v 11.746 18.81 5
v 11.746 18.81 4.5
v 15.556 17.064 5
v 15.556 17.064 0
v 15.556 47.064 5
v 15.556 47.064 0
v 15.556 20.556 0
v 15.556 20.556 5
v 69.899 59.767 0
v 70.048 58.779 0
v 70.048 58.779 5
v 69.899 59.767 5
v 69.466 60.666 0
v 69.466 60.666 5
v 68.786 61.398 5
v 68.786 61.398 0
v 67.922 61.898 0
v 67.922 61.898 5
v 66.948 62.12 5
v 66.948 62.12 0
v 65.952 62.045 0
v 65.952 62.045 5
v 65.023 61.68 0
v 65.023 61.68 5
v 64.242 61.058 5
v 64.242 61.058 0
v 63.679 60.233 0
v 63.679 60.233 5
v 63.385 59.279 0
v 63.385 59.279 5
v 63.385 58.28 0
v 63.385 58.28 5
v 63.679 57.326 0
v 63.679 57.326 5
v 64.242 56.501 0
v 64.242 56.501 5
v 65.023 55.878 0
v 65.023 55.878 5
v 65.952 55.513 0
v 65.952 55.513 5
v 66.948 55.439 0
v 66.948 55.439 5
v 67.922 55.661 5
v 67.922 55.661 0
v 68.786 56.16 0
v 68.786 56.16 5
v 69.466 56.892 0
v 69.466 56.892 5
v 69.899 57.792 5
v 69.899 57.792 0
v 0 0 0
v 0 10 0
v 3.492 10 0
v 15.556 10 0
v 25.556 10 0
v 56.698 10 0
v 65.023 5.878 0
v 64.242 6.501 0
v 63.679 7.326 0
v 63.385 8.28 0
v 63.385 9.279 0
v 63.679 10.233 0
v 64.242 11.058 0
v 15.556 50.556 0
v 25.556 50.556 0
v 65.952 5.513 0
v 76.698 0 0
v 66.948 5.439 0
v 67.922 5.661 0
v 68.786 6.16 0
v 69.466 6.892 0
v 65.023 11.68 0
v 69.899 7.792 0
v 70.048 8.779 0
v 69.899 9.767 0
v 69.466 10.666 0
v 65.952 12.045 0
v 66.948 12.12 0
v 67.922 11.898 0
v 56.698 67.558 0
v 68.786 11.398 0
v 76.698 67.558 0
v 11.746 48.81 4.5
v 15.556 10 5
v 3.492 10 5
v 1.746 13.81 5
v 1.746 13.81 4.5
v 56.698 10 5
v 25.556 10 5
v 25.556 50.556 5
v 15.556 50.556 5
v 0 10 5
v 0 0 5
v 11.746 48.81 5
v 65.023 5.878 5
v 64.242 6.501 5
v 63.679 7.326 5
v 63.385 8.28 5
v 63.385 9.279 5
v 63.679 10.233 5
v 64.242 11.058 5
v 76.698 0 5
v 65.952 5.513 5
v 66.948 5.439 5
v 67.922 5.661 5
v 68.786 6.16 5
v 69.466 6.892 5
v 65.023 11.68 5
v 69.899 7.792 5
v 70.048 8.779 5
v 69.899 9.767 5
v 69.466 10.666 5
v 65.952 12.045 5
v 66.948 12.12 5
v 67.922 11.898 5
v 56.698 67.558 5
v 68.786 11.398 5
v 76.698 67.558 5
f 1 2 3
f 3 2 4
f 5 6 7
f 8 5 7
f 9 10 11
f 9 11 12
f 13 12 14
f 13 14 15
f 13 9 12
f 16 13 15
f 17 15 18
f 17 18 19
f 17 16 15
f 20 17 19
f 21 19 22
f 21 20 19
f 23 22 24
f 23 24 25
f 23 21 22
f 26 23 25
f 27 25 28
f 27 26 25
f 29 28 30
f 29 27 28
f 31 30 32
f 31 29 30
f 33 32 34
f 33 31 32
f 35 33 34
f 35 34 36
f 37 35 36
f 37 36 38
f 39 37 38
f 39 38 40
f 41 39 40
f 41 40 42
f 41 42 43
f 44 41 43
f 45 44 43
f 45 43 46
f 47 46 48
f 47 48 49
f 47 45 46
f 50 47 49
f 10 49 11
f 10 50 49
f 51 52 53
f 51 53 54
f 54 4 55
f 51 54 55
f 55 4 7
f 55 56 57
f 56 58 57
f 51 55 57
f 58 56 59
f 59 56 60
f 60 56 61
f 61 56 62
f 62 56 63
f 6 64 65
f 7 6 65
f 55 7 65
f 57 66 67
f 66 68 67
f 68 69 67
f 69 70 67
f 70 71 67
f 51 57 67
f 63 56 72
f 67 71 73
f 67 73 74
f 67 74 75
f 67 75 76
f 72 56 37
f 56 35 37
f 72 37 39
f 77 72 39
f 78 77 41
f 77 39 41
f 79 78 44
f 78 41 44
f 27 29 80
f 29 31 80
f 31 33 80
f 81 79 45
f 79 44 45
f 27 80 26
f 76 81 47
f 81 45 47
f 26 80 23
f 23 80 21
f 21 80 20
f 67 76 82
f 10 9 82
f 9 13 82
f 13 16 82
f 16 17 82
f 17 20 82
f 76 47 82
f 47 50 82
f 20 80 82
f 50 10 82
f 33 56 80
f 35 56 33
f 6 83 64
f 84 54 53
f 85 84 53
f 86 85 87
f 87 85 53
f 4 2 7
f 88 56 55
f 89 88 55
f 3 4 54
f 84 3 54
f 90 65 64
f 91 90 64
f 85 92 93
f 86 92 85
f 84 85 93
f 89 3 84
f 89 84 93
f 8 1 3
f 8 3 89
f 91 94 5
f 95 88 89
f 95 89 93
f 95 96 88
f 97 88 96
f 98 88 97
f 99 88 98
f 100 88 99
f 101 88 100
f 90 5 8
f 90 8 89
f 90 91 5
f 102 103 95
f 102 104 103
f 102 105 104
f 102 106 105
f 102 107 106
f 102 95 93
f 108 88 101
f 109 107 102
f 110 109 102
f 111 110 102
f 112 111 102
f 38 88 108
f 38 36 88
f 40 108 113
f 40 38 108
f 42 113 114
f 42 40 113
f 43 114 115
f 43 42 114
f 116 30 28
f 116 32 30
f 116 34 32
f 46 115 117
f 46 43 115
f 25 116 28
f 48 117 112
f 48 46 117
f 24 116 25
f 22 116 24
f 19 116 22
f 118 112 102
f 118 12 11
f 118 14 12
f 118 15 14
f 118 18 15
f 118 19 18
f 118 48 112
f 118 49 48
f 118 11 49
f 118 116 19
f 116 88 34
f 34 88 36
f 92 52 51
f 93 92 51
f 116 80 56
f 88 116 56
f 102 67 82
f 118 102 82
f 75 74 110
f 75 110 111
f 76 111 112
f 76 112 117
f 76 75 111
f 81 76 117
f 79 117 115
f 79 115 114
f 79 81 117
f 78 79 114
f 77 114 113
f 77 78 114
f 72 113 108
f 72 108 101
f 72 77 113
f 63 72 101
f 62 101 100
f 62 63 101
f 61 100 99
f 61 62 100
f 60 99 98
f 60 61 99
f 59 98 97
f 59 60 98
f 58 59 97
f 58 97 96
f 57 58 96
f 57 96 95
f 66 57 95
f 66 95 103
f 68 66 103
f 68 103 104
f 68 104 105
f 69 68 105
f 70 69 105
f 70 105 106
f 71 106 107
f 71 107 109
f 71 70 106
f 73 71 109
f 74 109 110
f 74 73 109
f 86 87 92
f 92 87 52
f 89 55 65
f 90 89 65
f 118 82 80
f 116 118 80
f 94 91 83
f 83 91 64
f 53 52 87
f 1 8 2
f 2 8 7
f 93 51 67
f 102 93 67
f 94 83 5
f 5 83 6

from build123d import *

# Parameters (mm, degrees)
F0_R     = 3.350006
F1_DEPTH = 5
F3_DEPTH = 40.5559613398
F5_DEPTH = 15.5559613398


# Not quite as in the source:
# - a feature names something its author has since deleted; it is built from what else it names


with BuildPart() as f1:
    # F0 (on Top) → F1 (new body)
    with BuildSketch(Plane.XY):
        Polygon((0, 10), (3.4919226796, 10), (1.7459613398, 13.81), align=None)
        Polygon((15.5559613398, 18.81), (15.5559613398, 20.5559613398), (11.7459613398, 18.81), align=None)
        Polygon((15.5559613398, 47.0640386602), (15.5559613398, 50.5559613398), (11.7459613398, 48.81), align=None)
        Polygon((25.5559613398, 50.5559613398), (15.5559613398, 50.5559613398), (15.5559613398, 47.0640386602), (15.5559613398, 20.5559613398), (15.5559613398, 18.81), (15.5559613398, 17.0640386602), (15.5559613398, 10), (3.4919226796, 10), (0, 10), (0, 0), (76.6976781032, 0), (76.6976781032, 67.5584669805), (56.6976781032, 67.5584669805), (56.6976781032, 10), (25.5559613398, 10), align=None)
        with Locations((66.6976781032, 8.7792334903)):
            Circle(F0_R, mode=Mode.SUBTRACT)
        with Locations((66.6976781032, 58.7792334903)):
            Circle(F0_R, mode=Mode.SUBTRACT)
        Polygon((15.5559613398, 17.0640386602), (15.5559613398, 18.81), (11.7459613398, 18.81), align=None)
    extrude(amount=F1_DEPTH)

    # F2 (on face) → F3 (cut, through all)
    with BuildSketch(Plane(origin=(0, 50.5559613398, 0), x_dir=(-1, 0, 0), z_dir=(0, 1, 0))):
        Polygon((-11.7459613398, 4.5), (-15.5559613398, 0), (-11.7459613398, 0), align=None)
    extrude(amount=-F3_DEPTH, mode=Mode.SUBTRACT)

    # F4 (on face) → F5 (cut, through all)
    with BuildSketch(Plane(origin=(0, 0, 0), x_dir=(0, -1, 0), z_dir=(-1, 0, 0))):
        Polygon((-13.81, 0), (-10, 0), (-13.81, 4.5), align=None)
    extrude(amount=-F5_DEPTH, mode=Mode.SUBTRACT)


solid = f1.part
